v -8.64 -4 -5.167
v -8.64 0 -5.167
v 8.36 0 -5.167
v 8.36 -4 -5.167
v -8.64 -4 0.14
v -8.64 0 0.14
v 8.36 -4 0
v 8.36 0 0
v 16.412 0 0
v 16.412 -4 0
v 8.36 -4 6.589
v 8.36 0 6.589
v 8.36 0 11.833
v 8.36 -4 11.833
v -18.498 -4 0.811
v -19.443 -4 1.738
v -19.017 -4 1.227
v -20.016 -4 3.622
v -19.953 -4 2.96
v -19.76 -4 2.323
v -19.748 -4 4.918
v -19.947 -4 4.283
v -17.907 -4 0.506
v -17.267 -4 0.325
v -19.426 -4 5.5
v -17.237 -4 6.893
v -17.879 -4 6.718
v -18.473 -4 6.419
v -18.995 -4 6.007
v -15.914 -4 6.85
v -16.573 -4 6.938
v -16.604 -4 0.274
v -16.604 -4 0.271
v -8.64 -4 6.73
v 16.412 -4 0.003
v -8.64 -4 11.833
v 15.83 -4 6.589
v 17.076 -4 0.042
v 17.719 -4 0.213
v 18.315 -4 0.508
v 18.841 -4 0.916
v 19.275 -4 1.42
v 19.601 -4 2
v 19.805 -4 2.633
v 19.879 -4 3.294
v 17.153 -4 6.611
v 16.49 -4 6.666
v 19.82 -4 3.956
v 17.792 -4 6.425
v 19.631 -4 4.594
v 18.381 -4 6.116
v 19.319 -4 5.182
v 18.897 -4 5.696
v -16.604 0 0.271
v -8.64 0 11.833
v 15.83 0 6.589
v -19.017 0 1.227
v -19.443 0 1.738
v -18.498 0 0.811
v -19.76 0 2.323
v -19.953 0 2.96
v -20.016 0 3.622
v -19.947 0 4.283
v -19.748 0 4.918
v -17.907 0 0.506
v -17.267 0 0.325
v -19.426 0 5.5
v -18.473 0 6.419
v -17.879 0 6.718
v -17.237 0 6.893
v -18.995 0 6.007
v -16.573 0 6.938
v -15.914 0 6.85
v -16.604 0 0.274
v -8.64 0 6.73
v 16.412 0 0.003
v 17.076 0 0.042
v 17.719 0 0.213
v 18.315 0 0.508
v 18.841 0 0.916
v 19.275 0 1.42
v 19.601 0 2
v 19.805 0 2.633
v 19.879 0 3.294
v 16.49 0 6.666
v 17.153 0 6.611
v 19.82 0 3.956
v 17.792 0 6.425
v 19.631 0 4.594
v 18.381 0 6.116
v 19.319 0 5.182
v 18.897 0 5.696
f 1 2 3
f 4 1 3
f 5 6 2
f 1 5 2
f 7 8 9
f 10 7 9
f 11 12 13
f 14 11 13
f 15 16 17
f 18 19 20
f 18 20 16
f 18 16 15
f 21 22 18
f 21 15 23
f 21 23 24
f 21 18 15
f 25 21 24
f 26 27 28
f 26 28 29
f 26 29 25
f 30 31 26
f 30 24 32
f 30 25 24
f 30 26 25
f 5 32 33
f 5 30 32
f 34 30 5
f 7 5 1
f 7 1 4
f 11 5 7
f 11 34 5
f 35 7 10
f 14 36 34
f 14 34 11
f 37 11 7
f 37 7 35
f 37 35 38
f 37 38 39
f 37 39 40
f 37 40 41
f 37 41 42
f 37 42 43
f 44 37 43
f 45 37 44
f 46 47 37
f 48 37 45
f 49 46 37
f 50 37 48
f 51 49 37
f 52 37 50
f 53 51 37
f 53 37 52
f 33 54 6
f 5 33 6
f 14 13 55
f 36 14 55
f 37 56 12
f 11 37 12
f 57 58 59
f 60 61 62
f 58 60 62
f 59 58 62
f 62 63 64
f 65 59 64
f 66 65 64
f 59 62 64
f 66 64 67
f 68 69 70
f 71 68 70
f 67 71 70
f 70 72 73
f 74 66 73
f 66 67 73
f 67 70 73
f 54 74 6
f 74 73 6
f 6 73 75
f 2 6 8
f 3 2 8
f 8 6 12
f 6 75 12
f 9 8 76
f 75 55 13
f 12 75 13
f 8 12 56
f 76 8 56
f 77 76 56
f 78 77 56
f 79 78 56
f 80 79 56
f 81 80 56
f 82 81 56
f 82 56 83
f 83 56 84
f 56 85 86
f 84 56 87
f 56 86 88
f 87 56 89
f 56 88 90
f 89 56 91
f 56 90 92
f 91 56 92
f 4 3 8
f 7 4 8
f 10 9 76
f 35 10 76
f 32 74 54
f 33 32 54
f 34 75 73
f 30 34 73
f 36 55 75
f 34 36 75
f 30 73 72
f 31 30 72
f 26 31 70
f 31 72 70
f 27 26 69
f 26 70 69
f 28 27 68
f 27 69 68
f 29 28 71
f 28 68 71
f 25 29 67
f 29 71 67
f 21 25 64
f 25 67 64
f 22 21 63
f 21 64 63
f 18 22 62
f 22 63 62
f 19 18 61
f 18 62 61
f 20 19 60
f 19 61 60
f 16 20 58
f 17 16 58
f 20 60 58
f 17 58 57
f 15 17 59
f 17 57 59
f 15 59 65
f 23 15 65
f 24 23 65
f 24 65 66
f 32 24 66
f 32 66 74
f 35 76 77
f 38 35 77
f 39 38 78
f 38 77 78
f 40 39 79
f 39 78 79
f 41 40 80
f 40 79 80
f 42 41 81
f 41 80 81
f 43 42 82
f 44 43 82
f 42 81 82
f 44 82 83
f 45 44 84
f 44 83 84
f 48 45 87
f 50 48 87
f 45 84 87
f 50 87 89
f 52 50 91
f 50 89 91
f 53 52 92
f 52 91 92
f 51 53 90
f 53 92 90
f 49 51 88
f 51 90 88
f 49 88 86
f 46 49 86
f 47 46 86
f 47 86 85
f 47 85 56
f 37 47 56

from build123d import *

# Parameters (mm, degrees)
F1_DEPTH = 4


with BuildPart() as f1:
    # F0 (on Front) → F1 (new body)
    with BuildSketch(Plane.XZ):
        Polygon((0, 11.8332719468), (-8.6397333108, 11.8332719468), (-8.6397333108, 6.7300641264), (-8.6397333108, 0.1404409475), (-8.6397333108, -5.1667280532), (-0.1397333108, -5.1667280532), align=None)
        Polygon((8.3602666892, 11.8332719468), (0, 11.8332719468), (-0.1397333108, -5.1667280532), (8.3602666892, -5.1667280532), (8.3602666892, 0), (8.3602666892, 6.5887328237), align=None)
        with BuildLine():
            Line((-8.6397333108, 0.1404409475), (-8.6397333108, 6.7300641264))
            Line((-8.6397333108, 6.7300641264), (-15.9138074311, 6.8496522601))
            ThreePointArc((-15.9138074311, 6.8496522601), (-14.0683365047, 5.6735222105), (-13.3499665501, 3.6064011588))
            ThreePointArc((-13.3499665501, 3.6064011588), (-14.2983442905, 1.2776715705), (-16.6038153702, 0.2740755688))
            Line((-16.6038153702, 0.2740755688), (-16.6038047398, 0.2713728604))
            Line((-16.6038047398, 0.2713728604), (-8.6397333108, 0.1404409475))
        make_face()
        with BuildLine():
            ThreePointArc((-13.3499665501, 3.6064011588), (-14.0683365047, 5.6735222105), (-15.9138074311, 6.8496522601))
            Line((-15.9138074311, 6.8496522601), (-16.6297248975, 6.8614221751))
            Line((-16.6297248975, 6.8614221751), (-16.6038153702, 0.2740755688))
            ThreePointArc((-16.6038153702, 0.2740755688), (-14.2983442905, 1.2776715705), (-13.3499665501, 3.6064011588))
        make_face()
        with BuildLine():
            Line((-16.6297248975, 6.8614221751), (-15.9138074311, 6.8496522601))
            ThreePointArc((-15.9138074311, 6.8496522601), (-19.9983087172, 3.954267951), (-16.6038153702, 0.2740755688))
            Line((-16.6038153702, 0.2740755688), (-16.6297248975, 6.8614221751))
        make_face()
        with BuildLine():
            Line((15.8297359903, 6.5887328237), (8.3602666892, 6.5887328237))
            Line((8.3602666892, 6.5887328237), (8.3602666892, 0))
            Line((8.3602666892, 0), (16.4115056396, 0))
            Line((16.4115056396, 0), (16.4115606959, 0.0027021685))
            ThreePointArc((16.4115606959, 0.0027021685), (13.2254096253, 3.0399456203), (15.8297359903, 6.5887328237))
        make_face()
        with BuildLine():
            Line((16.5457502007, 6.5887328237), (15.8297359903, 6.5887328237))
            ThreePointArc((15.8297359903, 6.5887328237), (13.2254096253, 3.0399456203), (16.4115606959, 0.0027021685))
            Line((16.4115606959, 0.0027021685), (16.5457502007, 6.5887328237))
        make_face()
        with BuildLine():
            ThreePointArc((19.8790221475, 3.3332719468), (18.634294166, 5.9310952618), (15.8297359903, 6.5887328237))
            Line((15.8297359903, 6.5887328237), (16.5457502007, 6.5887328237))
            Line((16.5457502007, 6.5887328237), (16.4115606959, 0.0027021685))
            ThreePointArc((16.4115606959, 0.0027021685), (18.8547988965, 0.929317706), (19.8790221475, 3.3332719468))
        make_face()
    extrude(amount=F1_DEPTH)


solid = f1.part
